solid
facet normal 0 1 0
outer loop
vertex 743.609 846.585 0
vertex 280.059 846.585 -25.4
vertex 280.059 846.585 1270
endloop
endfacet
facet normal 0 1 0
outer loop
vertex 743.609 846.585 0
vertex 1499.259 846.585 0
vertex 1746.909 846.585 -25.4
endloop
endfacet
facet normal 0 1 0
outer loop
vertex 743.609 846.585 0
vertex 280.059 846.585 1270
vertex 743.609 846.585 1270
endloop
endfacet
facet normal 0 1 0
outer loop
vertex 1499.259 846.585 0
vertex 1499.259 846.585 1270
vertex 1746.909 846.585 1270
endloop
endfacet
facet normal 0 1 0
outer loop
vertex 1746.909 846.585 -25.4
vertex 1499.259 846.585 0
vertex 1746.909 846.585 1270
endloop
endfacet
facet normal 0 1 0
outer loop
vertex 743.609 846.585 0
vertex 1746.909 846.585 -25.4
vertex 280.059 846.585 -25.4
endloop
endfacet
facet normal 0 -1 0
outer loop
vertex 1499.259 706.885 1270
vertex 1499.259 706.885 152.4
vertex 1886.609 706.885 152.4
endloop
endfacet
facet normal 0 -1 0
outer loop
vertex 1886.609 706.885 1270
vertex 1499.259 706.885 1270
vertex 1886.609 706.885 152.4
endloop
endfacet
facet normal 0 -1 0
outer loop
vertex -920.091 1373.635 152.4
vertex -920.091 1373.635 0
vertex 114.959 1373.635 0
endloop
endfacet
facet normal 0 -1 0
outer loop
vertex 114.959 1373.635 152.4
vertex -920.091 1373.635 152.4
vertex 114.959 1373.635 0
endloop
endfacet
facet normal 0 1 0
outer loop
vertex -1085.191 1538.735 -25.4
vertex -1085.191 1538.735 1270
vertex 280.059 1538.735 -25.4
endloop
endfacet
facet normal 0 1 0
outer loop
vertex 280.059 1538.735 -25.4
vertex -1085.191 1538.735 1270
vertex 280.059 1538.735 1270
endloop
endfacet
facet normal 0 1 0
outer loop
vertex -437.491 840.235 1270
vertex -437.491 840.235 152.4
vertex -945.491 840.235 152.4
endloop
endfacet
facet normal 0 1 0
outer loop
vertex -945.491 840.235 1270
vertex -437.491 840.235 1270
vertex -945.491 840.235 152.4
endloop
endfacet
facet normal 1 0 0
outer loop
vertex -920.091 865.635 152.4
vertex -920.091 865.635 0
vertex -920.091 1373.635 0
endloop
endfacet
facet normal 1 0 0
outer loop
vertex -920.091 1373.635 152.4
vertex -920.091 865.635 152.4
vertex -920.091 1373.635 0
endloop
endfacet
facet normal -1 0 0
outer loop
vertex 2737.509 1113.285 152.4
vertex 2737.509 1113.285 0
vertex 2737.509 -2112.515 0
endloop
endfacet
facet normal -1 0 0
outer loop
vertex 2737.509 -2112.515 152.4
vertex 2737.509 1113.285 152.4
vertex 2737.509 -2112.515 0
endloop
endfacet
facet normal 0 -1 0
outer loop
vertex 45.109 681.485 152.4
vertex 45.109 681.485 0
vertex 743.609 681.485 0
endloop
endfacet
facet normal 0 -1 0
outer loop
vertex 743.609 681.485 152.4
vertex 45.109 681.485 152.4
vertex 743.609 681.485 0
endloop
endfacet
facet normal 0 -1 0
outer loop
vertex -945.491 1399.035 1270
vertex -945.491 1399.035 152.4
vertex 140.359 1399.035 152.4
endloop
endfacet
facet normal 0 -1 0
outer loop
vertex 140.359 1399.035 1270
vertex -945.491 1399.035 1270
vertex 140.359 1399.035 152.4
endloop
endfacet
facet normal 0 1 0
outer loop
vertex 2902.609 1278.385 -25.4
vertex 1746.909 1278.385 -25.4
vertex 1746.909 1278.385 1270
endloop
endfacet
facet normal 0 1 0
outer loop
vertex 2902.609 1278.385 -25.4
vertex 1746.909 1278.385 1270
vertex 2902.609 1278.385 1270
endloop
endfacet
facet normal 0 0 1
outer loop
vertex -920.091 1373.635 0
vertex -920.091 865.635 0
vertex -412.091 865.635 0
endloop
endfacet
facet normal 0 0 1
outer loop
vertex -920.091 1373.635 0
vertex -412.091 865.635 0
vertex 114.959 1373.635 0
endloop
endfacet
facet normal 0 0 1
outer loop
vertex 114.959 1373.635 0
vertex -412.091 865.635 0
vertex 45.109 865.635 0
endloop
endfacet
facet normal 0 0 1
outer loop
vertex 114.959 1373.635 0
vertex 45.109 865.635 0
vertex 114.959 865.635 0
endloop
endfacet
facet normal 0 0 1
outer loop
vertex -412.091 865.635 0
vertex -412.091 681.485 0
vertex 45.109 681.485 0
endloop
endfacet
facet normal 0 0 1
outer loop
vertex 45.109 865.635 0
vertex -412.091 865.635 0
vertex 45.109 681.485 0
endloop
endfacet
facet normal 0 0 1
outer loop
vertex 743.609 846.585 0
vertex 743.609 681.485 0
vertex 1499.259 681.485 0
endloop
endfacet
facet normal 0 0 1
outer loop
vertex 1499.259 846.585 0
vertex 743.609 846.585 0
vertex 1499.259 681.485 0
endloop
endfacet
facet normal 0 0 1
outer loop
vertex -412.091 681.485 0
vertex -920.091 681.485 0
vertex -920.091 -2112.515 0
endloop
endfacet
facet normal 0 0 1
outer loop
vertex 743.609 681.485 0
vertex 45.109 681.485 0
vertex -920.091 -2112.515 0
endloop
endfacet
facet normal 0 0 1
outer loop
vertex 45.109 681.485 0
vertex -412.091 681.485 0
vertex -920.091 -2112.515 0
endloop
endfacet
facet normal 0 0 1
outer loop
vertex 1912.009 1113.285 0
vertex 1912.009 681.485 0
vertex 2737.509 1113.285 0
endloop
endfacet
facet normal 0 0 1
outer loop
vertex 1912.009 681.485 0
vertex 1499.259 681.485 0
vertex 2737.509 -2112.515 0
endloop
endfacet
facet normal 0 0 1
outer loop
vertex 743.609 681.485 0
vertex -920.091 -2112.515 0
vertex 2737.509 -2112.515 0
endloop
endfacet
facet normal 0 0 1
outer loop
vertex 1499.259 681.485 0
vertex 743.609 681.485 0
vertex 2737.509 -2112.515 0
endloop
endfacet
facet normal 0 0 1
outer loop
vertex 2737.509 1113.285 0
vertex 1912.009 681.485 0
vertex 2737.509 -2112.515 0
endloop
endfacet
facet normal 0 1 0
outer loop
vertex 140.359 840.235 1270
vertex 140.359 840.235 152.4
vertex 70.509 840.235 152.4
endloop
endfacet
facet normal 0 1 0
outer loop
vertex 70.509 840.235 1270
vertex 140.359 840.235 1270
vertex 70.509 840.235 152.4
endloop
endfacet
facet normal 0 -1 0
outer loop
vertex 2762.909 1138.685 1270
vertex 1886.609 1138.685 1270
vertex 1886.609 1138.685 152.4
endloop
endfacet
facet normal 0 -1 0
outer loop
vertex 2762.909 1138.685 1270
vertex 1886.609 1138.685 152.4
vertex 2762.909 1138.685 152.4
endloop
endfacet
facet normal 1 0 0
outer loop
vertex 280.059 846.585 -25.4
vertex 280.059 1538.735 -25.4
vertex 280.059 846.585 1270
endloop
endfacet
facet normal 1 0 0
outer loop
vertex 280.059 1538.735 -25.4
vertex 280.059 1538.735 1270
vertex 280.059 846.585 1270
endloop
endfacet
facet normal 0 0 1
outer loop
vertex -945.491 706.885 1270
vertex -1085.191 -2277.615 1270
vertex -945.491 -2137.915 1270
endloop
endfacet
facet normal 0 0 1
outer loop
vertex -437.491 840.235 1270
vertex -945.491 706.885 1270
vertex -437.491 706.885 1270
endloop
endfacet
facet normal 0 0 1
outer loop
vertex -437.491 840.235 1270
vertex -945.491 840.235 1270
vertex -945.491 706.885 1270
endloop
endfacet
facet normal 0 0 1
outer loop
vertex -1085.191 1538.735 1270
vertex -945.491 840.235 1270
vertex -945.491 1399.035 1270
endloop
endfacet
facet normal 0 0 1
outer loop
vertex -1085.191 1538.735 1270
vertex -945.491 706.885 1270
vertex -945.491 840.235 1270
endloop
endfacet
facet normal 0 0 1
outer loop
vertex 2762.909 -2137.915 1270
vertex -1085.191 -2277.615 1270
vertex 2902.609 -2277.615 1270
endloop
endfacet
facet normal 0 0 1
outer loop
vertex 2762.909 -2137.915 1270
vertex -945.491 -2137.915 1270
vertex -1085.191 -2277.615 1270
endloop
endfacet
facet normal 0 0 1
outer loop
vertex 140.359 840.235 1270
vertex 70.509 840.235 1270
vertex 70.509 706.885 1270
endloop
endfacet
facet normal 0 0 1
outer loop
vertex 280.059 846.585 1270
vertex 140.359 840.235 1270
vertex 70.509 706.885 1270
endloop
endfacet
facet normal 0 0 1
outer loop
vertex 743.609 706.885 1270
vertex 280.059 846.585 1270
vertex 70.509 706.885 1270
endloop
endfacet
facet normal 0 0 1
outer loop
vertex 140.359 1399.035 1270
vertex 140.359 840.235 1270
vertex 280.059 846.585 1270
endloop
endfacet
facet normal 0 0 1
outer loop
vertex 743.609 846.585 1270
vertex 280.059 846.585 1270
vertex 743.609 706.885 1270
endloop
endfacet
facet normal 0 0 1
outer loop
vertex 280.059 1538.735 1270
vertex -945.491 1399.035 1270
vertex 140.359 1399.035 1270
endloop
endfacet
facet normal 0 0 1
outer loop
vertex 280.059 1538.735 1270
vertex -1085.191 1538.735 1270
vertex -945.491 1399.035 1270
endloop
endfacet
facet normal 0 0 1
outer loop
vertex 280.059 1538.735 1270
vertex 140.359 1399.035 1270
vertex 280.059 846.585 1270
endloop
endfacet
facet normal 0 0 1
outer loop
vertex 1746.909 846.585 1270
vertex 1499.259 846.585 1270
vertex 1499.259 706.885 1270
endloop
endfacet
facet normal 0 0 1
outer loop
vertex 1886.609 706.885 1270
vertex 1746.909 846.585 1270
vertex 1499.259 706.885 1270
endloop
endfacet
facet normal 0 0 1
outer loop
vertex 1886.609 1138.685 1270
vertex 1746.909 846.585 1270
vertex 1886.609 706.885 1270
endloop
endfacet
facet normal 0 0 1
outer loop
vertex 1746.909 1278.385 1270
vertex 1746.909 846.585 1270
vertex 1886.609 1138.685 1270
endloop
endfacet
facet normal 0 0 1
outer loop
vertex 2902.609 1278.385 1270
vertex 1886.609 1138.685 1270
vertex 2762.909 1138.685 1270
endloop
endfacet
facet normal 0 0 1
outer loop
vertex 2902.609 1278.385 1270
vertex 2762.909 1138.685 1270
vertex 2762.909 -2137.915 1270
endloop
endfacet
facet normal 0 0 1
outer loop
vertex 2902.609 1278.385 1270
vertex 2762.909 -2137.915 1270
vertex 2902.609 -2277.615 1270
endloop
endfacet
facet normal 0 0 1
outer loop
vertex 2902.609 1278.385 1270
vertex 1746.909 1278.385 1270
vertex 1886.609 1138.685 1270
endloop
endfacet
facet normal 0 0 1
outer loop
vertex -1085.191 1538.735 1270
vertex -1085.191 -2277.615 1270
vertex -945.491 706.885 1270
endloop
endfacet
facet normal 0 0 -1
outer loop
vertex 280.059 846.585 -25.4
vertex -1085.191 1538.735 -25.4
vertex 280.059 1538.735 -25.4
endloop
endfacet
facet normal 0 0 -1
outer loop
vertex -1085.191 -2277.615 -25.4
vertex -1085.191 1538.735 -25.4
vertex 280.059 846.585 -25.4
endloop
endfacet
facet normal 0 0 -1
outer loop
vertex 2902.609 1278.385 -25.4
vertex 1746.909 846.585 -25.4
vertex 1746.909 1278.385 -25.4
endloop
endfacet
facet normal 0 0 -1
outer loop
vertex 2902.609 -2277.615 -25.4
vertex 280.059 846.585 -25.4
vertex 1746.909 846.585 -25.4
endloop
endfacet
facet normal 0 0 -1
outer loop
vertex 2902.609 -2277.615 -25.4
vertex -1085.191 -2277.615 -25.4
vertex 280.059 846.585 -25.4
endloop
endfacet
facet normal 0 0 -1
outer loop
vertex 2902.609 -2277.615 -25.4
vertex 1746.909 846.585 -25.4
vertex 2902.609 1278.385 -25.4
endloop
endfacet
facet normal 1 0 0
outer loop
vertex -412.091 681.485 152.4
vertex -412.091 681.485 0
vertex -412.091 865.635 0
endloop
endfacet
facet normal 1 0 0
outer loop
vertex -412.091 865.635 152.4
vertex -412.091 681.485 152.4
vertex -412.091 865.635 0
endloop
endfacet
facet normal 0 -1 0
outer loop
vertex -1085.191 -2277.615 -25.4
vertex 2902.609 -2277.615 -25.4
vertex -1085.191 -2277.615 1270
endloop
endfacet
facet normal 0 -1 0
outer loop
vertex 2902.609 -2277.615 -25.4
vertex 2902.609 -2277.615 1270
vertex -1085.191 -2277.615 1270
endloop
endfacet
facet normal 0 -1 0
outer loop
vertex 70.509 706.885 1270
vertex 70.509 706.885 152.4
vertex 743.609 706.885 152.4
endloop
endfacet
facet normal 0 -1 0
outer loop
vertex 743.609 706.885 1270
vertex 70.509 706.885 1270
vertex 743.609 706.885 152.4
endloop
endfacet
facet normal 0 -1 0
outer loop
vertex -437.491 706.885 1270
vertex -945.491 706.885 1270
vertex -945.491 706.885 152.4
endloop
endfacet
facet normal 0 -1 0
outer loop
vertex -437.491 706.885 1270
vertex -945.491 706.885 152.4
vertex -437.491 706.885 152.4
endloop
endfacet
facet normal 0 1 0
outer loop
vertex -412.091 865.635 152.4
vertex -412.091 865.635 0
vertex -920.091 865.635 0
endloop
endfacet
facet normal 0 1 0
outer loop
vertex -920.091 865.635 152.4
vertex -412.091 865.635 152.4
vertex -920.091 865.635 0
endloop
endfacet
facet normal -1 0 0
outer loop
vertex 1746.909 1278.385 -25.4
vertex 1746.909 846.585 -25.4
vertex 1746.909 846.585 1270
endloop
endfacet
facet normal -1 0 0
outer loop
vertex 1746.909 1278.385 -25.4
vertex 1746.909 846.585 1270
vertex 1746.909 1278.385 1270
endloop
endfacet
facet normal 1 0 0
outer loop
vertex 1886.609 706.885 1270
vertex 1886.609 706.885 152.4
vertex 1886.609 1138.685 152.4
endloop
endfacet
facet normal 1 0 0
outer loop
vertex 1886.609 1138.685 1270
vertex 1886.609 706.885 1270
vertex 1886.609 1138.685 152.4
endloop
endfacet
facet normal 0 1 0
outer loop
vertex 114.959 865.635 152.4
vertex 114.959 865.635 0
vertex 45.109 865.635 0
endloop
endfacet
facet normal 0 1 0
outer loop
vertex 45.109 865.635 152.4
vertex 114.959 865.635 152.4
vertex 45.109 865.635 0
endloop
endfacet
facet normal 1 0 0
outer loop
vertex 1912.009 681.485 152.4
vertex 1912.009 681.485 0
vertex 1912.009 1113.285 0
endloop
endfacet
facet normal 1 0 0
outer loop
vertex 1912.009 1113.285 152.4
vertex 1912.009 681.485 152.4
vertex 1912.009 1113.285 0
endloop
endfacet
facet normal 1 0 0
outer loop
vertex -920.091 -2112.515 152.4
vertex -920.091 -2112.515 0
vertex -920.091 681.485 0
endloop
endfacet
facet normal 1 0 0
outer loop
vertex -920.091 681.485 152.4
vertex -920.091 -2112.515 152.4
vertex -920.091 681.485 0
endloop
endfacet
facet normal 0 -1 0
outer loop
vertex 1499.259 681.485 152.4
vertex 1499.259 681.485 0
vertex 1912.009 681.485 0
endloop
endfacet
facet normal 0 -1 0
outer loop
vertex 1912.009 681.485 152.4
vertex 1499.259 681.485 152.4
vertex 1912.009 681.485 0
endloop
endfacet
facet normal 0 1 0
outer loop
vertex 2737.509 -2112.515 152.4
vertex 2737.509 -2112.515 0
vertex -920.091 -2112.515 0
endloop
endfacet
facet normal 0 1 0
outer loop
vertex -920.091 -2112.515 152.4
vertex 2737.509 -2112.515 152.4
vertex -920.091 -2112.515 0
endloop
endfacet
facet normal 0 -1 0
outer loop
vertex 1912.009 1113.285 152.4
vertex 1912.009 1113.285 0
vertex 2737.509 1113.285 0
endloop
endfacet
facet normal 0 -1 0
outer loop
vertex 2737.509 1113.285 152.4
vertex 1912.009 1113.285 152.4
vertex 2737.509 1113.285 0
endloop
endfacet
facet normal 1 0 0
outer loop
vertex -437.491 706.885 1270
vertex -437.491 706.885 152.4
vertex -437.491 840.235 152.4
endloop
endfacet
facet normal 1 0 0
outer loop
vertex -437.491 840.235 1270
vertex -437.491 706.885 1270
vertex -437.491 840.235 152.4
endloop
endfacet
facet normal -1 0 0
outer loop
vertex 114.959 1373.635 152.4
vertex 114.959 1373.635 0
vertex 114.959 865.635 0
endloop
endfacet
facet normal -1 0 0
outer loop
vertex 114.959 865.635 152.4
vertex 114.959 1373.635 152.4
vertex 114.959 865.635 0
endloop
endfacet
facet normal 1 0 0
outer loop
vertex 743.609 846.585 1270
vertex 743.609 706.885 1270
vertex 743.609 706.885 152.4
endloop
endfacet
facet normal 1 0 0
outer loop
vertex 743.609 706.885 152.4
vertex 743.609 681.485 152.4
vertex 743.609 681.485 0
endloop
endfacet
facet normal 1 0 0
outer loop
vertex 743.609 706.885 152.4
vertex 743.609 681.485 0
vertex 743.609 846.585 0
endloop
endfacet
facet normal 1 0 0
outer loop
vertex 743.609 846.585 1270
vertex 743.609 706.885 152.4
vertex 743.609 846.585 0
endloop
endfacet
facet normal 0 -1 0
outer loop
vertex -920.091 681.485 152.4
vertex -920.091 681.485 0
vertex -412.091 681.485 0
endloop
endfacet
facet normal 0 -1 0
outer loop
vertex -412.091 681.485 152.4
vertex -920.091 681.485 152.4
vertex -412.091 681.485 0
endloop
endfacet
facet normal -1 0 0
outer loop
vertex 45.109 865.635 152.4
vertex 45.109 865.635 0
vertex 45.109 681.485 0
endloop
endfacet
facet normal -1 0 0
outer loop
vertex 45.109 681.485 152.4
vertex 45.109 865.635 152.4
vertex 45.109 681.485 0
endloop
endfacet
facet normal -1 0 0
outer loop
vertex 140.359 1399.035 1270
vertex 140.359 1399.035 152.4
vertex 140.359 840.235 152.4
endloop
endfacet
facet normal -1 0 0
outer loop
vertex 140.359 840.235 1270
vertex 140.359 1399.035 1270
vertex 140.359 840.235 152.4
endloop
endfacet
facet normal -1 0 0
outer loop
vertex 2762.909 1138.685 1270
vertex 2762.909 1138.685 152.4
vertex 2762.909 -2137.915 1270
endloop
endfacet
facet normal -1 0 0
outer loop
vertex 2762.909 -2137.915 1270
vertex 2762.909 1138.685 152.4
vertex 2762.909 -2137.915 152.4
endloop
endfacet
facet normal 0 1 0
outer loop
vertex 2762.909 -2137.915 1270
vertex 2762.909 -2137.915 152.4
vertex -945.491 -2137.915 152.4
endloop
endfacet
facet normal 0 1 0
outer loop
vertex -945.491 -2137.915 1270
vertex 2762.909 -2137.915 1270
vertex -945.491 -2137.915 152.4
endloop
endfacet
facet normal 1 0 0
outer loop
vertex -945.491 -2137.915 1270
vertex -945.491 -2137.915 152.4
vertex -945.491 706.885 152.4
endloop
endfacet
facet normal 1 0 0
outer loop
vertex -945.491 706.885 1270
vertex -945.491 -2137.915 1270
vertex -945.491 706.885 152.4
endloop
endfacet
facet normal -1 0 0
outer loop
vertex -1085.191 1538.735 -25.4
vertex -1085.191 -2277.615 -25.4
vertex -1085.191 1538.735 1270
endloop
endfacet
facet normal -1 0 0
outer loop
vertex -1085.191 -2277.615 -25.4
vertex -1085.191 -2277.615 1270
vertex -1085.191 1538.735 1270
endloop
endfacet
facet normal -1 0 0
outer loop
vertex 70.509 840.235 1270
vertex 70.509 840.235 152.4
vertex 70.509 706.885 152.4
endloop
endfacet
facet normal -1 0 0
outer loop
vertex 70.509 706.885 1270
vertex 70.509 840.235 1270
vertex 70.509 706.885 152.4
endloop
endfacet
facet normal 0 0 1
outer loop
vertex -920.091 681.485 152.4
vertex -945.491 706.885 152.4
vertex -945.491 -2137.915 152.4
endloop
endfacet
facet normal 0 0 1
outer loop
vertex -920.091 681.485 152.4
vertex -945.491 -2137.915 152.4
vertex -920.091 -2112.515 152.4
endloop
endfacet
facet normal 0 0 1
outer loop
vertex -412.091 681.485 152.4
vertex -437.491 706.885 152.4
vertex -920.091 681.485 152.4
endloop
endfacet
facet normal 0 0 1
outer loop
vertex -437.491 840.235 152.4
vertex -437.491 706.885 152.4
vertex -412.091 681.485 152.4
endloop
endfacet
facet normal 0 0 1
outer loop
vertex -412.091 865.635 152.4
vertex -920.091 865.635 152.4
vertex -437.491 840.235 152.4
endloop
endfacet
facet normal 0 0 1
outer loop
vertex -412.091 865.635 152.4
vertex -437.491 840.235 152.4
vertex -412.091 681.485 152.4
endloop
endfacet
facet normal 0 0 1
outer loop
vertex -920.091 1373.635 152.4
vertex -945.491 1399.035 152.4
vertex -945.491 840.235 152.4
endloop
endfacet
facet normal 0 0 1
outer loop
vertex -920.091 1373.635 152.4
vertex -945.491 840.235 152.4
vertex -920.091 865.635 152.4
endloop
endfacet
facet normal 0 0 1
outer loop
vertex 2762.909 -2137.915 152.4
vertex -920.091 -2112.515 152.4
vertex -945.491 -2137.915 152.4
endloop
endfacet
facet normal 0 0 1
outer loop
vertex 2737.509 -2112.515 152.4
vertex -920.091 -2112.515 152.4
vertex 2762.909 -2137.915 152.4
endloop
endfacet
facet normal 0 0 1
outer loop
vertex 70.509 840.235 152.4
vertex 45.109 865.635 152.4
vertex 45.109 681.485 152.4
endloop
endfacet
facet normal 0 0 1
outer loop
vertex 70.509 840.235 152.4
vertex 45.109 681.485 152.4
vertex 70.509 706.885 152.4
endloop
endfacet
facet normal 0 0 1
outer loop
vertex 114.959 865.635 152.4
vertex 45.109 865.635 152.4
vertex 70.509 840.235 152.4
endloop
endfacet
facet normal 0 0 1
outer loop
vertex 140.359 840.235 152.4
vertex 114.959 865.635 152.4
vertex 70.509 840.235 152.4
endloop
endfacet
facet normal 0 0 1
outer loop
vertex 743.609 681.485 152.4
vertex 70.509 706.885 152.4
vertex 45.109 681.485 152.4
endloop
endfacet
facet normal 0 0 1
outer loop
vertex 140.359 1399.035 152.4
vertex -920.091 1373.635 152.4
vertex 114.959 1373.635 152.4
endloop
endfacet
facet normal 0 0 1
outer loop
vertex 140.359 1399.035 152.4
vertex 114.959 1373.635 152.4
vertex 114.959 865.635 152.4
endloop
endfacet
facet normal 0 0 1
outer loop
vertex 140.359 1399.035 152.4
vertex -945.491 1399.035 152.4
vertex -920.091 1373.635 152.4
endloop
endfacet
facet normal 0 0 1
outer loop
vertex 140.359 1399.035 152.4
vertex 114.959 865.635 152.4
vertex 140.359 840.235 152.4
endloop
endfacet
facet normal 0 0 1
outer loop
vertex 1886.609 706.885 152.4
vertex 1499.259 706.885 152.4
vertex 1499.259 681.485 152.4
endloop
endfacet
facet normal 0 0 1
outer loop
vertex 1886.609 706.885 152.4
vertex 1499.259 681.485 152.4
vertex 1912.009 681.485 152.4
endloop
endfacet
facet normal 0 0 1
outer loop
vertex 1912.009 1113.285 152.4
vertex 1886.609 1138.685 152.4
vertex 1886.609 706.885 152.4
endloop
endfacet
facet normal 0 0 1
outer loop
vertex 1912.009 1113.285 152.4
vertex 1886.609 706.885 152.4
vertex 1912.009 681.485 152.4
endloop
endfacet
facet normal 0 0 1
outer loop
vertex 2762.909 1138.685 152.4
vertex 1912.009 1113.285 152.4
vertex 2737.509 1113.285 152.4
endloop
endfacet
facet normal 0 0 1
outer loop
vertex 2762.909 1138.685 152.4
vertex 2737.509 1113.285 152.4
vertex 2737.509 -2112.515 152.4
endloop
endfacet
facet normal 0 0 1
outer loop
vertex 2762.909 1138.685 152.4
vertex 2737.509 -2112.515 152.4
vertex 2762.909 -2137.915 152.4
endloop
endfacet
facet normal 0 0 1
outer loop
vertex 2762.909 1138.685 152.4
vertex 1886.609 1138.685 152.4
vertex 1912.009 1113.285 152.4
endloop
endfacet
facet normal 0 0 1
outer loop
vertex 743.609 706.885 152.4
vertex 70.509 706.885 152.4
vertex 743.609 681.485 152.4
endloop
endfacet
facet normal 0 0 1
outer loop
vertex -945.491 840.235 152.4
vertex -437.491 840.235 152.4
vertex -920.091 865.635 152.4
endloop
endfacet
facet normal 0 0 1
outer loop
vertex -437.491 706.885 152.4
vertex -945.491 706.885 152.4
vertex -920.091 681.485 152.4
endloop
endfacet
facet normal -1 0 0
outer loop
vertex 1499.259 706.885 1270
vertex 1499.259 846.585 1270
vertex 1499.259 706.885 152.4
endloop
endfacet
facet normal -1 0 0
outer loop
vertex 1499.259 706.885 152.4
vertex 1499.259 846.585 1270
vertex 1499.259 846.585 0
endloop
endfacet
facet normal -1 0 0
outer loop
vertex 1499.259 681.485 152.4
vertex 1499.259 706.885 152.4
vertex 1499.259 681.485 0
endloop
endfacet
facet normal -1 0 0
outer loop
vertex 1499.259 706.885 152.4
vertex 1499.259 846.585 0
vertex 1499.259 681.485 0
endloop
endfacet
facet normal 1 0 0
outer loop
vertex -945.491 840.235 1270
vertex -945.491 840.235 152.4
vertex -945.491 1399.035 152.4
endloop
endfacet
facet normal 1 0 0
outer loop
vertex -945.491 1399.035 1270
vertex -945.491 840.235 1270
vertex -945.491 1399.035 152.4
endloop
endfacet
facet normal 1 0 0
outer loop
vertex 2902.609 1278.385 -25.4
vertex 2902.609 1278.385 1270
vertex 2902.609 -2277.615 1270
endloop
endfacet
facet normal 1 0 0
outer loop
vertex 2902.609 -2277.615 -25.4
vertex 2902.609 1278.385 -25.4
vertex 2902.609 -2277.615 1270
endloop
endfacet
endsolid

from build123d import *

# Parameters (mm, degrees)
F1_DEPTH = 1270
F3_DEPTH = 25.4
F5_DEPTH = 152.4


with BuildPart() as f1:
    # F0 (on Top) → F1 (new body)
    with BuildSketch(Plane.XY):
        Polygon((70.508858, 840.235406), (70.508858, 706.885406), (743.608858, 706.885406), (743.608858, 846.585406), (280.058858, 846.585406), (280.058858, 1538.735406), (-1085.191142, 1538.735406), (-1085.191142, -2277.614594), (2902.608858, -2277.614594), (2902.608858, 1278.385406), (1746.908858, 1278.385406), (1746.908858, 846.585406), (1499.258858, 846.585406), (1499.258858, 706.885406), (1886.608858, 706.885406), (1886.608858, 1138.685406), (2762.908858, 1138.685406), (2762.908858, -2137.914594), (-945.491142, -2137.914594), (-945.491142, 706.885406), (-437.491142, 706.885406), (-437.491142, 840.235406), (-945.491142, 840.235406), (-945.491142, 1399.035406), (140.358858, 1399.035406), (140.358858, 840.235406), align=None)
    extrude(amount=F1_DEPTH)

    # F2 (on face) → F3 (join)
    with BuildSketch(Plane(origin=(0, 0, 0), x_dir=(1, 0, 0), z_dir=(0, 0, -1))):
        Polygon((2902.608858, -1278.385406), (2902.608858, 2277.614594), (-1085.191142, 2277.614594), (-1085.191142, -1538.735406), (280.058858, -1538.735406), (280.058858, -846.585406), (1746.908858, -846.585406), (1746.908858, -1278.385406), align=None)
    extrude(amount=F3_DEPTH)

    # F4 (on face) → F5 (join)
    with BuildSketch(Plane.XY):
        Polygon((2762.908858, 1138.685406), (1886.608858, 1138.685406), (1886.608858, 706.885406), (1499.258858, 706.885406), (1499.258858, 681.485406), (1912.008858, 681.485406), (1912.008858, 1113.285406), (2737.508858, 1113.285406), (2737.508858, -2112.514594), (-920.091142, -2112.514594), (-920.091142, 681.485406), (-412.091142, 681.485406), (-412.091142, 865.635406), (-920.091142, 865.635406), (-920.091142, 1373.635406), (114.958858, 1373.635406), (114.958858, 865.635406), (45.108858, 865.635406), (45.108858, 681.485406), (743.608858, 681.485406), (743.608858, 706.885406), (70.508858, 706.885406), (70.508858, 840.235406), (140.358858, 840.235406), (140.358858, 1399.035406), (-945.491142, 1399.035406), (-945.491142, 840.235406), (-437.491142, 840.235406), (-437.491142, 706.885406), (-945.491142, 706.885406), (-945.491142, -2137.914594), (2762.908858, -2137.914594), align=None)
    extrude(amount=F5_DEPTH)


solid = f1.part
